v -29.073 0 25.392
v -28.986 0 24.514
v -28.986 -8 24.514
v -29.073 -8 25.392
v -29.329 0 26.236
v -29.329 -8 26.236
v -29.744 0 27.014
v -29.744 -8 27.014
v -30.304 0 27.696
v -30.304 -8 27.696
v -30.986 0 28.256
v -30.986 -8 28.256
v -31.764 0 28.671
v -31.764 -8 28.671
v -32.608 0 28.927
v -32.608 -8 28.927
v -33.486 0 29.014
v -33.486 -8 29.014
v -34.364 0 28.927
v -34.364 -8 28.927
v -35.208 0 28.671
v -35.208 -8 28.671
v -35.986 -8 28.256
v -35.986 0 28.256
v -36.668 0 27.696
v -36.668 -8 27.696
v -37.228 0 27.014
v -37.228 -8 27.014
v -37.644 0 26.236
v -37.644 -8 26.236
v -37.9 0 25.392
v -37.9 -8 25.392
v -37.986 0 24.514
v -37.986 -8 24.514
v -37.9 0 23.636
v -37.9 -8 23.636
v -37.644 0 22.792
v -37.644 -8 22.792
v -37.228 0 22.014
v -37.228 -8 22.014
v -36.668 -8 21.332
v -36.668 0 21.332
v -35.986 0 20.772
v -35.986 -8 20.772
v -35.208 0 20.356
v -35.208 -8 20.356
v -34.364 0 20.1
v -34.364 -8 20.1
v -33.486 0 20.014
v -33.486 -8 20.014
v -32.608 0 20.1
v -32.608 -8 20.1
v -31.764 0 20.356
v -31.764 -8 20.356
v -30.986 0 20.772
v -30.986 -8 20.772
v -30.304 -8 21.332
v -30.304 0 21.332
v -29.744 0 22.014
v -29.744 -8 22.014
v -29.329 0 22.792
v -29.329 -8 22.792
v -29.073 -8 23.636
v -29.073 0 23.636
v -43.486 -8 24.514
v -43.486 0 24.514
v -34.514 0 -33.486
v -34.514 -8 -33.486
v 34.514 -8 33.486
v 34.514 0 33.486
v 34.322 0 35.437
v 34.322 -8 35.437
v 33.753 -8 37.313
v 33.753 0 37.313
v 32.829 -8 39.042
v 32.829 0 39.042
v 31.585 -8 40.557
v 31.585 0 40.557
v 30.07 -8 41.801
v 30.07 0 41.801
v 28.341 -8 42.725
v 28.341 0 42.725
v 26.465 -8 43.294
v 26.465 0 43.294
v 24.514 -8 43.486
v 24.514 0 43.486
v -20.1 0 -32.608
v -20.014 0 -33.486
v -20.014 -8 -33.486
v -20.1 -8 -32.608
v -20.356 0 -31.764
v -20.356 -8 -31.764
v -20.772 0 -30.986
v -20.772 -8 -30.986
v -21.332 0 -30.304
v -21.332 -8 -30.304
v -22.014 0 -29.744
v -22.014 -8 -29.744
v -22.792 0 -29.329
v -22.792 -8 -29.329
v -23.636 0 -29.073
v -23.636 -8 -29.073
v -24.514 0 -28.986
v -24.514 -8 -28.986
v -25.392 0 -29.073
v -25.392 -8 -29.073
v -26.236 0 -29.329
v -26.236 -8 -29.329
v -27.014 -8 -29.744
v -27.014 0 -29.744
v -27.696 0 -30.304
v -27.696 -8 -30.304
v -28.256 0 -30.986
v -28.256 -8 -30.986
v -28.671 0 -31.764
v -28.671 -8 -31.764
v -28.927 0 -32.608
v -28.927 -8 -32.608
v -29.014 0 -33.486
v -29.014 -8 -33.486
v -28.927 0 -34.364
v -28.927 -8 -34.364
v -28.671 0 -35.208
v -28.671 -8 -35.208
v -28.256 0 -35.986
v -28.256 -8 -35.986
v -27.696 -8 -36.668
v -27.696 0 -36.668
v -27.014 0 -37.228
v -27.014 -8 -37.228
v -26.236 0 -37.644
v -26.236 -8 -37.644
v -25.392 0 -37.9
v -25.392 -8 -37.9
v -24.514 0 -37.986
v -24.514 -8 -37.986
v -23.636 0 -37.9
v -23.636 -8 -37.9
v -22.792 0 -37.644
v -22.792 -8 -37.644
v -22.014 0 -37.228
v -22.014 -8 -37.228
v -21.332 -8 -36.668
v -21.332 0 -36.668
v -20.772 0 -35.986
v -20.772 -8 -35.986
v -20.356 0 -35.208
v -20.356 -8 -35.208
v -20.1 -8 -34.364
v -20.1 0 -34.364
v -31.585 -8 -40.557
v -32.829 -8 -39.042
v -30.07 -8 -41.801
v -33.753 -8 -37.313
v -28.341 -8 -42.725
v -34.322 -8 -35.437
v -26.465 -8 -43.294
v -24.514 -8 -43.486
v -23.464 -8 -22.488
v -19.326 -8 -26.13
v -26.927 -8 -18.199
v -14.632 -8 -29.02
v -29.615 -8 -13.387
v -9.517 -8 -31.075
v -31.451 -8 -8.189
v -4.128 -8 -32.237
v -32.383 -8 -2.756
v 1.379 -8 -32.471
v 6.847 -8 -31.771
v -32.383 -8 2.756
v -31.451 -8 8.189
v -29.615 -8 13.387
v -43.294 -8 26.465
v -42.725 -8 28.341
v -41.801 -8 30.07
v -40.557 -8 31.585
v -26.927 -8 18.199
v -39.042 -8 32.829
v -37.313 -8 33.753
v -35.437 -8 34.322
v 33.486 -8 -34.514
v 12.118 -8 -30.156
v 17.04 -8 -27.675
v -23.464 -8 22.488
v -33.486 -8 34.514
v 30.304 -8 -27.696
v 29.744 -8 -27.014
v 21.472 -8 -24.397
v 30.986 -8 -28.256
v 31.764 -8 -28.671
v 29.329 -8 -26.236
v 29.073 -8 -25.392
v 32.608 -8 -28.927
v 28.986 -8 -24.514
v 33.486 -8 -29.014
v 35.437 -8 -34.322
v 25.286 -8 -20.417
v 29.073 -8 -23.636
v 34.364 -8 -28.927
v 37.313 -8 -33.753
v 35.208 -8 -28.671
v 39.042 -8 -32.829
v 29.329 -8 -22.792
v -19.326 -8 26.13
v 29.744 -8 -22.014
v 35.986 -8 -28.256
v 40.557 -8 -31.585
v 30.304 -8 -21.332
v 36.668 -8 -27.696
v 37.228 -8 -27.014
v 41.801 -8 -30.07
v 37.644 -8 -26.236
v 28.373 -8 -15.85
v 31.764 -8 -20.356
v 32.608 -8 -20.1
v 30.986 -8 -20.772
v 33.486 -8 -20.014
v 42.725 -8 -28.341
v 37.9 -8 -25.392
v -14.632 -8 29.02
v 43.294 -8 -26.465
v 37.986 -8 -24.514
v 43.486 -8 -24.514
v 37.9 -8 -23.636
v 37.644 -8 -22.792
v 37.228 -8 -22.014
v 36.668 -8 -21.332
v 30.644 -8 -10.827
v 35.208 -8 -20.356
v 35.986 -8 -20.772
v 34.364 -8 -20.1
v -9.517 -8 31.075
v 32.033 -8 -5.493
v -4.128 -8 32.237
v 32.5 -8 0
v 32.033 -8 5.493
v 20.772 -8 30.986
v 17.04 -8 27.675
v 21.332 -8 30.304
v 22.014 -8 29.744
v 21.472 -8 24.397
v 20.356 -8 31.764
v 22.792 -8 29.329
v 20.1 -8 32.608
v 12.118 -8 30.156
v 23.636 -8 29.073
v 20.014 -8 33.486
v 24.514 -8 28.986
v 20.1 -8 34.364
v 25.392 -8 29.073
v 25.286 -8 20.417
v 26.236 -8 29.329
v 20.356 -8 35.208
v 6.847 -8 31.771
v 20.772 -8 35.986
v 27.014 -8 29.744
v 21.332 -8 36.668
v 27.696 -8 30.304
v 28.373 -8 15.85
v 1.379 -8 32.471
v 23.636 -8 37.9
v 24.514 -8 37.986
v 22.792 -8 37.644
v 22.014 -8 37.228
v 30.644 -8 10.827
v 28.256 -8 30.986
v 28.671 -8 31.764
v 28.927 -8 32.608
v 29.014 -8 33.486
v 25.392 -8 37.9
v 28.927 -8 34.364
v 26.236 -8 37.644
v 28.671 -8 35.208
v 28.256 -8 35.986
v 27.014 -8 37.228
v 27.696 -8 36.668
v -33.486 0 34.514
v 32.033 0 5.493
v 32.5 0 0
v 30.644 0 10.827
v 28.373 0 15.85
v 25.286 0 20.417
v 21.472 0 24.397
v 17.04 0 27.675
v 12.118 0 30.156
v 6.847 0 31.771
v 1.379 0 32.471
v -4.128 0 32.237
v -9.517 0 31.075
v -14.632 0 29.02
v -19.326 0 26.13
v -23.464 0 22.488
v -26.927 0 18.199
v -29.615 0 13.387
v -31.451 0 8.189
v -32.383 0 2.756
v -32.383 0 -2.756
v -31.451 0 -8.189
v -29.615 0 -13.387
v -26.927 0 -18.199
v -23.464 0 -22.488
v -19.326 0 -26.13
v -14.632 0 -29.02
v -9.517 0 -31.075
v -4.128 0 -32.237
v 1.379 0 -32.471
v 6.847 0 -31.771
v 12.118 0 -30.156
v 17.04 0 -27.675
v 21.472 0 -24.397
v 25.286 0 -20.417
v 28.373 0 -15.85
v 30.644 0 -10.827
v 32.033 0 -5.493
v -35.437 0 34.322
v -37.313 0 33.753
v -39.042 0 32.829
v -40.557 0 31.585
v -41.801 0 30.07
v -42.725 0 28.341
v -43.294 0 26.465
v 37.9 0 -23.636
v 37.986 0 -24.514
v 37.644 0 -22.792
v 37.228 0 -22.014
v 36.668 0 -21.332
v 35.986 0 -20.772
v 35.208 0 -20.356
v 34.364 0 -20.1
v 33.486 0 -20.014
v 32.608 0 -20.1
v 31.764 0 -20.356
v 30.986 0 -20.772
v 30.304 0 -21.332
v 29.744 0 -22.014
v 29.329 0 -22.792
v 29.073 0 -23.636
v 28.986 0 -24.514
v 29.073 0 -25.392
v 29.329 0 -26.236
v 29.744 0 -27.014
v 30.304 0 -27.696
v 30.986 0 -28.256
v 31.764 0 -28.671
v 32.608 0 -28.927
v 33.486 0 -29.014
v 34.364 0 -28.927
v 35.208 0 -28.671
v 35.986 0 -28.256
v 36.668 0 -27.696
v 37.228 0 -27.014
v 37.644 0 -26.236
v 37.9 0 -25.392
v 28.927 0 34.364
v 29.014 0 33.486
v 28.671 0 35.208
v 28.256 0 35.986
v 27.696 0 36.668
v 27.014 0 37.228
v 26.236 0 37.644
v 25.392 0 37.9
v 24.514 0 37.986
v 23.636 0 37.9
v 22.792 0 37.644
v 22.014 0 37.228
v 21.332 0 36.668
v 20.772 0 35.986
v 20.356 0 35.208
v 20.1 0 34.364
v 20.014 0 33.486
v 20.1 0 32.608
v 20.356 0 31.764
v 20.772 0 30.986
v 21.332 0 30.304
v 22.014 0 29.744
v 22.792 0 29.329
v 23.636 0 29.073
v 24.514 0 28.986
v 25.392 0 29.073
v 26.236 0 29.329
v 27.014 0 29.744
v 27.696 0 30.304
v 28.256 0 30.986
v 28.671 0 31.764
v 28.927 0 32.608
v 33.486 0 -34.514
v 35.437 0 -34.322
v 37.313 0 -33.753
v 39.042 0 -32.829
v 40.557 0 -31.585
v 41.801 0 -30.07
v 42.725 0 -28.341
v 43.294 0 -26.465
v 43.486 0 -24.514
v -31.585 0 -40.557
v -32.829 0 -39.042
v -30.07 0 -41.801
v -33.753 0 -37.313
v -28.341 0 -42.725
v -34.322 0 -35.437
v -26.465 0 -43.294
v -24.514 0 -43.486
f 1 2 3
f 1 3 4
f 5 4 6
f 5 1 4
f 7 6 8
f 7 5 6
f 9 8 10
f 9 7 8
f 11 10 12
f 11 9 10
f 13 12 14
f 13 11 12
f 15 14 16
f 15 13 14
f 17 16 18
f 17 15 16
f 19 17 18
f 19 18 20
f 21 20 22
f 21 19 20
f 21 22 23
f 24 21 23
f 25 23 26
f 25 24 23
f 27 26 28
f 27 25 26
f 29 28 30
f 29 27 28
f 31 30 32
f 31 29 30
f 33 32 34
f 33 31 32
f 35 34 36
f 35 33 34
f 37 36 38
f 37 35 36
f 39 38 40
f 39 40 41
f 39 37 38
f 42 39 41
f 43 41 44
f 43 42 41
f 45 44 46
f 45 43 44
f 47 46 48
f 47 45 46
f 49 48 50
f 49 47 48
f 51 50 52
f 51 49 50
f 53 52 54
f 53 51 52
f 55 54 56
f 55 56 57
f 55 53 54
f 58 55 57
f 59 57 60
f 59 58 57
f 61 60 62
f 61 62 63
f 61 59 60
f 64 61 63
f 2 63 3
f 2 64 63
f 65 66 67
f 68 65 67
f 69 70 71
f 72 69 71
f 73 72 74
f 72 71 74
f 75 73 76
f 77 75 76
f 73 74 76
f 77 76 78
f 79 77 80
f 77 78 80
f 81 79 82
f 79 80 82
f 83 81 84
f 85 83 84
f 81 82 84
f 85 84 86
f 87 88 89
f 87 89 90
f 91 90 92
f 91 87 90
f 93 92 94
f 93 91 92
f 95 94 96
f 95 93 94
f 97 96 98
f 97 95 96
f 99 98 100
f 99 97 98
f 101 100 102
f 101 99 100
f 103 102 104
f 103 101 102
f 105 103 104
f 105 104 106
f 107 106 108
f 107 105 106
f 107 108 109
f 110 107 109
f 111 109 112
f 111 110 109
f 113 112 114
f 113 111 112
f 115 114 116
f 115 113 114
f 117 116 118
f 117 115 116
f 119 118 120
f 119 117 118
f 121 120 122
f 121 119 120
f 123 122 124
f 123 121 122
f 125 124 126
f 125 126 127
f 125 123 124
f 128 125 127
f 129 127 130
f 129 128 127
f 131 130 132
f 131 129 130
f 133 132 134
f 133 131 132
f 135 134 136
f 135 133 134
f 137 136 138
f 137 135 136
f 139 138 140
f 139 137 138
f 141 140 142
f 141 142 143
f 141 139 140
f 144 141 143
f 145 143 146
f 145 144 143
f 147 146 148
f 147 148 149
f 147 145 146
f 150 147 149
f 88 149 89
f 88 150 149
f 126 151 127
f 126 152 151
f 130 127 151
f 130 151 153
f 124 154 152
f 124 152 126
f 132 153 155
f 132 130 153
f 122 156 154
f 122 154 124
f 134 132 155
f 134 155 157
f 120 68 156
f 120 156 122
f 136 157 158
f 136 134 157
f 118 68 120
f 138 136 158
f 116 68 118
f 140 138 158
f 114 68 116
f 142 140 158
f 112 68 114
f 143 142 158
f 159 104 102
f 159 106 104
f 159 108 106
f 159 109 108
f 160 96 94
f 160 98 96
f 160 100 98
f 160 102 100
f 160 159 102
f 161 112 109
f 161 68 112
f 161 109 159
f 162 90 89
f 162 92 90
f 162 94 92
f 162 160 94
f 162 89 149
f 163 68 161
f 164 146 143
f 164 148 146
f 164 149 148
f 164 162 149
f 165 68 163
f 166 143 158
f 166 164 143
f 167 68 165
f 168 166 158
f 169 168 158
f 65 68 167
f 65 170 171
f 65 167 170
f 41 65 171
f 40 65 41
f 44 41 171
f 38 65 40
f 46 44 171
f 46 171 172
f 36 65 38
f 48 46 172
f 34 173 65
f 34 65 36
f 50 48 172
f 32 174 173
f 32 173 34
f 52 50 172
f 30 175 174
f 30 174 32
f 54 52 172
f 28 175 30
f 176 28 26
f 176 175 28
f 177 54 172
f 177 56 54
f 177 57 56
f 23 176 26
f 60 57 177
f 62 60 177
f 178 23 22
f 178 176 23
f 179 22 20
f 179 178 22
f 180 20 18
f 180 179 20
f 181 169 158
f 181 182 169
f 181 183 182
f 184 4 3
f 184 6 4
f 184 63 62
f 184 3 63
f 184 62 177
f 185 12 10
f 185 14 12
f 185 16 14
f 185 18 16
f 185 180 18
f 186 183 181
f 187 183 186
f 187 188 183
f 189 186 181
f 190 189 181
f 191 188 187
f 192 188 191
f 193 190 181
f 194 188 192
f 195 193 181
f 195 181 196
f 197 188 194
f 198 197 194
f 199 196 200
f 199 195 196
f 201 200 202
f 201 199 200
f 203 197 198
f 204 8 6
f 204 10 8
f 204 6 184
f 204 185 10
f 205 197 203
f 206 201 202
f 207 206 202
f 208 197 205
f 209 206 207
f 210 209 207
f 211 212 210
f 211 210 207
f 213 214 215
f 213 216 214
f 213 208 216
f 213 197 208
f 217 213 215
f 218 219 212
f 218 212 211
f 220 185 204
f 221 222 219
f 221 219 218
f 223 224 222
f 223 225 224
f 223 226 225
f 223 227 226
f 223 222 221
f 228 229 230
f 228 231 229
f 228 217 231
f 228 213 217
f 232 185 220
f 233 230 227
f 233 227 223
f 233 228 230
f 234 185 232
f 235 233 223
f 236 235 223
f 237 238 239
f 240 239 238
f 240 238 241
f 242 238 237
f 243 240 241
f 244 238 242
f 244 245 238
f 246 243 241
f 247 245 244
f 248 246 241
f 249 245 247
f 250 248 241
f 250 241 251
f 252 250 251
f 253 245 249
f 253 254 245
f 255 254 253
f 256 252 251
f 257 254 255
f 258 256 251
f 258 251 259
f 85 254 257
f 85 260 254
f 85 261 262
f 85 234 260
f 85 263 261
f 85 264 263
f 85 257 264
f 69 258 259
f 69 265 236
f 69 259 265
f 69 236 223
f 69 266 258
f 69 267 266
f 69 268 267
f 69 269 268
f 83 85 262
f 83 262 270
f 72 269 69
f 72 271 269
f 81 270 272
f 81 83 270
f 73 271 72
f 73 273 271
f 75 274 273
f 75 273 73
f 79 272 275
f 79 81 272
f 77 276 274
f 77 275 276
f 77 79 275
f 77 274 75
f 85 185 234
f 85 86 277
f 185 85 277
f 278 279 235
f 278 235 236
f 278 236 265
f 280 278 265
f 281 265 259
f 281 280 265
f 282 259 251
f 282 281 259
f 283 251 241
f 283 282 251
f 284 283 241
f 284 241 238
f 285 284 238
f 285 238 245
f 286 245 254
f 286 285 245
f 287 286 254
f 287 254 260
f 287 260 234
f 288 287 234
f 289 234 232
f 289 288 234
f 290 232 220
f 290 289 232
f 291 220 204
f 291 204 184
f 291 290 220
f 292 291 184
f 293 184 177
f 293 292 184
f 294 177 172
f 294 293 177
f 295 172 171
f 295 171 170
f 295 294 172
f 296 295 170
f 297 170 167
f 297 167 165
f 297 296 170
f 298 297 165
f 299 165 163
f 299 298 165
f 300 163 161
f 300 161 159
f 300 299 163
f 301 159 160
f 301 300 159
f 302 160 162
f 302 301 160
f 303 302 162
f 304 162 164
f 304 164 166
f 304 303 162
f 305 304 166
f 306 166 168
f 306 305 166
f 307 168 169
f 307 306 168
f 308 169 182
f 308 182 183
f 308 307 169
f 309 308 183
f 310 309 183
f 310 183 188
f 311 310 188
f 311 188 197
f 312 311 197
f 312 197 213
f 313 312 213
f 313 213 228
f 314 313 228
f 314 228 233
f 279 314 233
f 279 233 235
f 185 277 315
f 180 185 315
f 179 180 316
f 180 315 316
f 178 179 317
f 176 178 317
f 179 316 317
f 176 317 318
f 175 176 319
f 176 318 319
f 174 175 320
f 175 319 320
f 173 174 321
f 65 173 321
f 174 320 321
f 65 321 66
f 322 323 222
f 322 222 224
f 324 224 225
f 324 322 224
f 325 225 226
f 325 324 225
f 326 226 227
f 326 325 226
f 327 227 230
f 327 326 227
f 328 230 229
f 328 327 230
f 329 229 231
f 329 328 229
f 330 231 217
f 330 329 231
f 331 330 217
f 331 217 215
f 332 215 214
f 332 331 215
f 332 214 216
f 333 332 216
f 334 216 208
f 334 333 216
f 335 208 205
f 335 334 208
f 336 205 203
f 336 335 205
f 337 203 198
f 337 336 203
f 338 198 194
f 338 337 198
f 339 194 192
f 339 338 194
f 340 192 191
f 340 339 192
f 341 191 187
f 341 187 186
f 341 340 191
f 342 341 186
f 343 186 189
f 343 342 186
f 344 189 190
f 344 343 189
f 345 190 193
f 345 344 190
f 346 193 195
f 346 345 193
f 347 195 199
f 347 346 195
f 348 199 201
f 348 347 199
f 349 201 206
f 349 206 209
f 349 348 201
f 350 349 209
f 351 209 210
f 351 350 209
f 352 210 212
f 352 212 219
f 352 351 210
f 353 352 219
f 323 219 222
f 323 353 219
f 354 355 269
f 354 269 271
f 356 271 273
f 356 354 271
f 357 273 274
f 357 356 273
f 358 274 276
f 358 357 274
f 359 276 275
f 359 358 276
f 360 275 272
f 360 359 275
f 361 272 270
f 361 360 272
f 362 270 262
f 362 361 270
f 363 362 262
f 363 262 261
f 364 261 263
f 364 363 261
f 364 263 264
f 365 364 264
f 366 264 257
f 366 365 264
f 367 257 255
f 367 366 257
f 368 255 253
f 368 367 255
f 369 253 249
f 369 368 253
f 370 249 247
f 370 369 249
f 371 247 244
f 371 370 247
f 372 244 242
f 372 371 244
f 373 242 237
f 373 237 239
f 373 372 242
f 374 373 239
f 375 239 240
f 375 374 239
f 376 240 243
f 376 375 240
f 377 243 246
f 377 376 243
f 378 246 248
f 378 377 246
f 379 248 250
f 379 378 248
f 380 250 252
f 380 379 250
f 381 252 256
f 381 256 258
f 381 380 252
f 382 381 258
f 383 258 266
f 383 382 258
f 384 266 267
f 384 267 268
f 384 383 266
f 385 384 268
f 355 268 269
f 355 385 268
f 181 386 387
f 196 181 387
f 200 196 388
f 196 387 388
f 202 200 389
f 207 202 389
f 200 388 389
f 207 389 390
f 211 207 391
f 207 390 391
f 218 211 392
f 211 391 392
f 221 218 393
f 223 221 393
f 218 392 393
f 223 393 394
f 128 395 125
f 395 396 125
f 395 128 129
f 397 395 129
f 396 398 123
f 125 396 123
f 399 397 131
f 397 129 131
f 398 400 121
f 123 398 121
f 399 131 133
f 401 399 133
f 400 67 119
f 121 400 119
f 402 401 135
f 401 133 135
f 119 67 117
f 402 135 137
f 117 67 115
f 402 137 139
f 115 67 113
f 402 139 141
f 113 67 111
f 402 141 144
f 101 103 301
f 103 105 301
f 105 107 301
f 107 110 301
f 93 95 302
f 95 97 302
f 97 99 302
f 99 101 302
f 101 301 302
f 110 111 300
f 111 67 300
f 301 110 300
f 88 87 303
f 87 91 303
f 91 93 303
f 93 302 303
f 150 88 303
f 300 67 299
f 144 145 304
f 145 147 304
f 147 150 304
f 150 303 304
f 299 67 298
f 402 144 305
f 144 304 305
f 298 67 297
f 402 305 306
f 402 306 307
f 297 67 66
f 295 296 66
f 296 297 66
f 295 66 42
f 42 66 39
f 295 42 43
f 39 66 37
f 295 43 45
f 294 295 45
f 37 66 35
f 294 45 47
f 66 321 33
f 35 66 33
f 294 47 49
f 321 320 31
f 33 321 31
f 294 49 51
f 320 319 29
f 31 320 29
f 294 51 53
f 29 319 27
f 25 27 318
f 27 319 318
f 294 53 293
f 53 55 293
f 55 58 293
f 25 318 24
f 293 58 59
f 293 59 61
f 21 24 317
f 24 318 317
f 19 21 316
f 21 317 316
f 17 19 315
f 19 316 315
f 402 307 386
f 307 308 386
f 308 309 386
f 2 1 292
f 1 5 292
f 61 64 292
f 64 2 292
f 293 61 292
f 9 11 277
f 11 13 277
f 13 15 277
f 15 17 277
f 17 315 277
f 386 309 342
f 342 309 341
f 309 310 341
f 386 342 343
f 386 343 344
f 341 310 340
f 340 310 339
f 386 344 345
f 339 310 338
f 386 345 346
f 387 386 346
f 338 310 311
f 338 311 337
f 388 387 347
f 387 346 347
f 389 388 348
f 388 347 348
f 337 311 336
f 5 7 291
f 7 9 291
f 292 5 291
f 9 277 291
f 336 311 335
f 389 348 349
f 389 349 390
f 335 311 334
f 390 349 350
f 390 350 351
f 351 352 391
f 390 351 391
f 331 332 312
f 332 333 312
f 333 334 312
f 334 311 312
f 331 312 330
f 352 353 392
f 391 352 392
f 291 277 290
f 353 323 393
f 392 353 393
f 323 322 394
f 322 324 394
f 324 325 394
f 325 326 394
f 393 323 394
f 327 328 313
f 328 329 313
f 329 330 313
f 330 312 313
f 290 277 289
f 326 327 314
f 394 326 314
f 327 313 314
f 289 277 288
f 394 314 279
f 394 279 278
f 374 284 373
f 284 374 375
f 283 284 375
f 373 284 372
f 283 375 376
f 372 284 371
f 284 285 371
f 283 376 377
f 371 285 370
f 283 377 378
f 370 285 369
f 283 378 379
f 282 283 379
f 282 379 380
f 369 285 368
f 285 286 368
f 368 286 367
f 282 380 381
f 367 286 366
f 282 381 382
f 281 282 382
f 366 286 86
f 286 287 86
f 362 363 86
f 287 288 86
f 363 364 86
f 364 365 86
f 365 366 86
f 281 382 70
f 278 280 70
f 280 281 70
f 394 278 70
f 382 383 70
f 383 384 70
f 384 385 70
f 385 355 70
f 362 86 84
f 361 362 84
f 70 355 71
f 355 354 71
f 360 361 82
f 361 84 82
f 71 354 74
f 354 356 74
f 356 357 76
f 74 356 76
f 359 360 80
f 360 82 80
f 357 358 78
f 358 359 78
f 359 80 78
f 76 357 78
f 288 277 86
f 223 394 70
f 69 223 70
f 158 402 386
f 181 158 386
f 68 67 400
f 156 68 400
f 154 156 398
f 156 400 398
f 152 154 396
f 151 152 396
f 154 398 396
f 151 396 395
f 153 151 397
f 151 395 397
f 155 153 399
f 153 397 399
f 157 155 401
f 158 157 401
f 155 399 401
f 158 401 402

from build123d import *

# Parameters (mm, degrees)
F0_R     = 4.5
F0_R_2   = 32.5
F1_DEPTH = 8


with BuildPart() as f1:
    # F0 (on Front) → F1 (new body)
    with BuildSketch(Plane.XZ):
        with BuildLine():
            Line((24.51391, 43.48609), (-33.48609, 34.51391))
            ThreePointArc((-33.48609, 34.51391), (-40.557157, 31.584978), (-43.48609, 24.51391))
            Line((-43.48609, 24.51391), (-34.51391, -33.48609))
            ThreePointArc((-34.51391, -33.48609), (-31.584978, -40.557157), (-24.51391, -43.48609))
            Line((-24.51391, -43.48609), (33.48609, -34.51391))
            ThreePointArc((33.48609, -34.51391), (40.557157, -31.584978), (43.48609, -24.51391))
            Line((43.48609, -24.51391), (34.51391, 33.48609))
            ThreePointArc((34.51391, 33.48609), (31.584978, 40.557157), (24.51391, 43.48609))
        make_face()
        with Locations((-24.51391, -33.48609)):
            Circle(F0_R, mode=Mode.SUBTRACT)
        with Locations((33.48609, -24.51391)):
            Circle(F0_R, mode=Mode.SUBTRACT)
        Circle(F0_R_2, mode=Mode.SUBTRACT)
        with Locations((-33.48609, 24.51391)):
            Circle(F0_R, mode=Mode.SUBTRACT)
        with Locations((24.51391, 33.48609)):
            Circle(F0_R, mode=Mode.SUBTRACT)
    extrude(amount=F1_DEPTH)


solid = f1.part
